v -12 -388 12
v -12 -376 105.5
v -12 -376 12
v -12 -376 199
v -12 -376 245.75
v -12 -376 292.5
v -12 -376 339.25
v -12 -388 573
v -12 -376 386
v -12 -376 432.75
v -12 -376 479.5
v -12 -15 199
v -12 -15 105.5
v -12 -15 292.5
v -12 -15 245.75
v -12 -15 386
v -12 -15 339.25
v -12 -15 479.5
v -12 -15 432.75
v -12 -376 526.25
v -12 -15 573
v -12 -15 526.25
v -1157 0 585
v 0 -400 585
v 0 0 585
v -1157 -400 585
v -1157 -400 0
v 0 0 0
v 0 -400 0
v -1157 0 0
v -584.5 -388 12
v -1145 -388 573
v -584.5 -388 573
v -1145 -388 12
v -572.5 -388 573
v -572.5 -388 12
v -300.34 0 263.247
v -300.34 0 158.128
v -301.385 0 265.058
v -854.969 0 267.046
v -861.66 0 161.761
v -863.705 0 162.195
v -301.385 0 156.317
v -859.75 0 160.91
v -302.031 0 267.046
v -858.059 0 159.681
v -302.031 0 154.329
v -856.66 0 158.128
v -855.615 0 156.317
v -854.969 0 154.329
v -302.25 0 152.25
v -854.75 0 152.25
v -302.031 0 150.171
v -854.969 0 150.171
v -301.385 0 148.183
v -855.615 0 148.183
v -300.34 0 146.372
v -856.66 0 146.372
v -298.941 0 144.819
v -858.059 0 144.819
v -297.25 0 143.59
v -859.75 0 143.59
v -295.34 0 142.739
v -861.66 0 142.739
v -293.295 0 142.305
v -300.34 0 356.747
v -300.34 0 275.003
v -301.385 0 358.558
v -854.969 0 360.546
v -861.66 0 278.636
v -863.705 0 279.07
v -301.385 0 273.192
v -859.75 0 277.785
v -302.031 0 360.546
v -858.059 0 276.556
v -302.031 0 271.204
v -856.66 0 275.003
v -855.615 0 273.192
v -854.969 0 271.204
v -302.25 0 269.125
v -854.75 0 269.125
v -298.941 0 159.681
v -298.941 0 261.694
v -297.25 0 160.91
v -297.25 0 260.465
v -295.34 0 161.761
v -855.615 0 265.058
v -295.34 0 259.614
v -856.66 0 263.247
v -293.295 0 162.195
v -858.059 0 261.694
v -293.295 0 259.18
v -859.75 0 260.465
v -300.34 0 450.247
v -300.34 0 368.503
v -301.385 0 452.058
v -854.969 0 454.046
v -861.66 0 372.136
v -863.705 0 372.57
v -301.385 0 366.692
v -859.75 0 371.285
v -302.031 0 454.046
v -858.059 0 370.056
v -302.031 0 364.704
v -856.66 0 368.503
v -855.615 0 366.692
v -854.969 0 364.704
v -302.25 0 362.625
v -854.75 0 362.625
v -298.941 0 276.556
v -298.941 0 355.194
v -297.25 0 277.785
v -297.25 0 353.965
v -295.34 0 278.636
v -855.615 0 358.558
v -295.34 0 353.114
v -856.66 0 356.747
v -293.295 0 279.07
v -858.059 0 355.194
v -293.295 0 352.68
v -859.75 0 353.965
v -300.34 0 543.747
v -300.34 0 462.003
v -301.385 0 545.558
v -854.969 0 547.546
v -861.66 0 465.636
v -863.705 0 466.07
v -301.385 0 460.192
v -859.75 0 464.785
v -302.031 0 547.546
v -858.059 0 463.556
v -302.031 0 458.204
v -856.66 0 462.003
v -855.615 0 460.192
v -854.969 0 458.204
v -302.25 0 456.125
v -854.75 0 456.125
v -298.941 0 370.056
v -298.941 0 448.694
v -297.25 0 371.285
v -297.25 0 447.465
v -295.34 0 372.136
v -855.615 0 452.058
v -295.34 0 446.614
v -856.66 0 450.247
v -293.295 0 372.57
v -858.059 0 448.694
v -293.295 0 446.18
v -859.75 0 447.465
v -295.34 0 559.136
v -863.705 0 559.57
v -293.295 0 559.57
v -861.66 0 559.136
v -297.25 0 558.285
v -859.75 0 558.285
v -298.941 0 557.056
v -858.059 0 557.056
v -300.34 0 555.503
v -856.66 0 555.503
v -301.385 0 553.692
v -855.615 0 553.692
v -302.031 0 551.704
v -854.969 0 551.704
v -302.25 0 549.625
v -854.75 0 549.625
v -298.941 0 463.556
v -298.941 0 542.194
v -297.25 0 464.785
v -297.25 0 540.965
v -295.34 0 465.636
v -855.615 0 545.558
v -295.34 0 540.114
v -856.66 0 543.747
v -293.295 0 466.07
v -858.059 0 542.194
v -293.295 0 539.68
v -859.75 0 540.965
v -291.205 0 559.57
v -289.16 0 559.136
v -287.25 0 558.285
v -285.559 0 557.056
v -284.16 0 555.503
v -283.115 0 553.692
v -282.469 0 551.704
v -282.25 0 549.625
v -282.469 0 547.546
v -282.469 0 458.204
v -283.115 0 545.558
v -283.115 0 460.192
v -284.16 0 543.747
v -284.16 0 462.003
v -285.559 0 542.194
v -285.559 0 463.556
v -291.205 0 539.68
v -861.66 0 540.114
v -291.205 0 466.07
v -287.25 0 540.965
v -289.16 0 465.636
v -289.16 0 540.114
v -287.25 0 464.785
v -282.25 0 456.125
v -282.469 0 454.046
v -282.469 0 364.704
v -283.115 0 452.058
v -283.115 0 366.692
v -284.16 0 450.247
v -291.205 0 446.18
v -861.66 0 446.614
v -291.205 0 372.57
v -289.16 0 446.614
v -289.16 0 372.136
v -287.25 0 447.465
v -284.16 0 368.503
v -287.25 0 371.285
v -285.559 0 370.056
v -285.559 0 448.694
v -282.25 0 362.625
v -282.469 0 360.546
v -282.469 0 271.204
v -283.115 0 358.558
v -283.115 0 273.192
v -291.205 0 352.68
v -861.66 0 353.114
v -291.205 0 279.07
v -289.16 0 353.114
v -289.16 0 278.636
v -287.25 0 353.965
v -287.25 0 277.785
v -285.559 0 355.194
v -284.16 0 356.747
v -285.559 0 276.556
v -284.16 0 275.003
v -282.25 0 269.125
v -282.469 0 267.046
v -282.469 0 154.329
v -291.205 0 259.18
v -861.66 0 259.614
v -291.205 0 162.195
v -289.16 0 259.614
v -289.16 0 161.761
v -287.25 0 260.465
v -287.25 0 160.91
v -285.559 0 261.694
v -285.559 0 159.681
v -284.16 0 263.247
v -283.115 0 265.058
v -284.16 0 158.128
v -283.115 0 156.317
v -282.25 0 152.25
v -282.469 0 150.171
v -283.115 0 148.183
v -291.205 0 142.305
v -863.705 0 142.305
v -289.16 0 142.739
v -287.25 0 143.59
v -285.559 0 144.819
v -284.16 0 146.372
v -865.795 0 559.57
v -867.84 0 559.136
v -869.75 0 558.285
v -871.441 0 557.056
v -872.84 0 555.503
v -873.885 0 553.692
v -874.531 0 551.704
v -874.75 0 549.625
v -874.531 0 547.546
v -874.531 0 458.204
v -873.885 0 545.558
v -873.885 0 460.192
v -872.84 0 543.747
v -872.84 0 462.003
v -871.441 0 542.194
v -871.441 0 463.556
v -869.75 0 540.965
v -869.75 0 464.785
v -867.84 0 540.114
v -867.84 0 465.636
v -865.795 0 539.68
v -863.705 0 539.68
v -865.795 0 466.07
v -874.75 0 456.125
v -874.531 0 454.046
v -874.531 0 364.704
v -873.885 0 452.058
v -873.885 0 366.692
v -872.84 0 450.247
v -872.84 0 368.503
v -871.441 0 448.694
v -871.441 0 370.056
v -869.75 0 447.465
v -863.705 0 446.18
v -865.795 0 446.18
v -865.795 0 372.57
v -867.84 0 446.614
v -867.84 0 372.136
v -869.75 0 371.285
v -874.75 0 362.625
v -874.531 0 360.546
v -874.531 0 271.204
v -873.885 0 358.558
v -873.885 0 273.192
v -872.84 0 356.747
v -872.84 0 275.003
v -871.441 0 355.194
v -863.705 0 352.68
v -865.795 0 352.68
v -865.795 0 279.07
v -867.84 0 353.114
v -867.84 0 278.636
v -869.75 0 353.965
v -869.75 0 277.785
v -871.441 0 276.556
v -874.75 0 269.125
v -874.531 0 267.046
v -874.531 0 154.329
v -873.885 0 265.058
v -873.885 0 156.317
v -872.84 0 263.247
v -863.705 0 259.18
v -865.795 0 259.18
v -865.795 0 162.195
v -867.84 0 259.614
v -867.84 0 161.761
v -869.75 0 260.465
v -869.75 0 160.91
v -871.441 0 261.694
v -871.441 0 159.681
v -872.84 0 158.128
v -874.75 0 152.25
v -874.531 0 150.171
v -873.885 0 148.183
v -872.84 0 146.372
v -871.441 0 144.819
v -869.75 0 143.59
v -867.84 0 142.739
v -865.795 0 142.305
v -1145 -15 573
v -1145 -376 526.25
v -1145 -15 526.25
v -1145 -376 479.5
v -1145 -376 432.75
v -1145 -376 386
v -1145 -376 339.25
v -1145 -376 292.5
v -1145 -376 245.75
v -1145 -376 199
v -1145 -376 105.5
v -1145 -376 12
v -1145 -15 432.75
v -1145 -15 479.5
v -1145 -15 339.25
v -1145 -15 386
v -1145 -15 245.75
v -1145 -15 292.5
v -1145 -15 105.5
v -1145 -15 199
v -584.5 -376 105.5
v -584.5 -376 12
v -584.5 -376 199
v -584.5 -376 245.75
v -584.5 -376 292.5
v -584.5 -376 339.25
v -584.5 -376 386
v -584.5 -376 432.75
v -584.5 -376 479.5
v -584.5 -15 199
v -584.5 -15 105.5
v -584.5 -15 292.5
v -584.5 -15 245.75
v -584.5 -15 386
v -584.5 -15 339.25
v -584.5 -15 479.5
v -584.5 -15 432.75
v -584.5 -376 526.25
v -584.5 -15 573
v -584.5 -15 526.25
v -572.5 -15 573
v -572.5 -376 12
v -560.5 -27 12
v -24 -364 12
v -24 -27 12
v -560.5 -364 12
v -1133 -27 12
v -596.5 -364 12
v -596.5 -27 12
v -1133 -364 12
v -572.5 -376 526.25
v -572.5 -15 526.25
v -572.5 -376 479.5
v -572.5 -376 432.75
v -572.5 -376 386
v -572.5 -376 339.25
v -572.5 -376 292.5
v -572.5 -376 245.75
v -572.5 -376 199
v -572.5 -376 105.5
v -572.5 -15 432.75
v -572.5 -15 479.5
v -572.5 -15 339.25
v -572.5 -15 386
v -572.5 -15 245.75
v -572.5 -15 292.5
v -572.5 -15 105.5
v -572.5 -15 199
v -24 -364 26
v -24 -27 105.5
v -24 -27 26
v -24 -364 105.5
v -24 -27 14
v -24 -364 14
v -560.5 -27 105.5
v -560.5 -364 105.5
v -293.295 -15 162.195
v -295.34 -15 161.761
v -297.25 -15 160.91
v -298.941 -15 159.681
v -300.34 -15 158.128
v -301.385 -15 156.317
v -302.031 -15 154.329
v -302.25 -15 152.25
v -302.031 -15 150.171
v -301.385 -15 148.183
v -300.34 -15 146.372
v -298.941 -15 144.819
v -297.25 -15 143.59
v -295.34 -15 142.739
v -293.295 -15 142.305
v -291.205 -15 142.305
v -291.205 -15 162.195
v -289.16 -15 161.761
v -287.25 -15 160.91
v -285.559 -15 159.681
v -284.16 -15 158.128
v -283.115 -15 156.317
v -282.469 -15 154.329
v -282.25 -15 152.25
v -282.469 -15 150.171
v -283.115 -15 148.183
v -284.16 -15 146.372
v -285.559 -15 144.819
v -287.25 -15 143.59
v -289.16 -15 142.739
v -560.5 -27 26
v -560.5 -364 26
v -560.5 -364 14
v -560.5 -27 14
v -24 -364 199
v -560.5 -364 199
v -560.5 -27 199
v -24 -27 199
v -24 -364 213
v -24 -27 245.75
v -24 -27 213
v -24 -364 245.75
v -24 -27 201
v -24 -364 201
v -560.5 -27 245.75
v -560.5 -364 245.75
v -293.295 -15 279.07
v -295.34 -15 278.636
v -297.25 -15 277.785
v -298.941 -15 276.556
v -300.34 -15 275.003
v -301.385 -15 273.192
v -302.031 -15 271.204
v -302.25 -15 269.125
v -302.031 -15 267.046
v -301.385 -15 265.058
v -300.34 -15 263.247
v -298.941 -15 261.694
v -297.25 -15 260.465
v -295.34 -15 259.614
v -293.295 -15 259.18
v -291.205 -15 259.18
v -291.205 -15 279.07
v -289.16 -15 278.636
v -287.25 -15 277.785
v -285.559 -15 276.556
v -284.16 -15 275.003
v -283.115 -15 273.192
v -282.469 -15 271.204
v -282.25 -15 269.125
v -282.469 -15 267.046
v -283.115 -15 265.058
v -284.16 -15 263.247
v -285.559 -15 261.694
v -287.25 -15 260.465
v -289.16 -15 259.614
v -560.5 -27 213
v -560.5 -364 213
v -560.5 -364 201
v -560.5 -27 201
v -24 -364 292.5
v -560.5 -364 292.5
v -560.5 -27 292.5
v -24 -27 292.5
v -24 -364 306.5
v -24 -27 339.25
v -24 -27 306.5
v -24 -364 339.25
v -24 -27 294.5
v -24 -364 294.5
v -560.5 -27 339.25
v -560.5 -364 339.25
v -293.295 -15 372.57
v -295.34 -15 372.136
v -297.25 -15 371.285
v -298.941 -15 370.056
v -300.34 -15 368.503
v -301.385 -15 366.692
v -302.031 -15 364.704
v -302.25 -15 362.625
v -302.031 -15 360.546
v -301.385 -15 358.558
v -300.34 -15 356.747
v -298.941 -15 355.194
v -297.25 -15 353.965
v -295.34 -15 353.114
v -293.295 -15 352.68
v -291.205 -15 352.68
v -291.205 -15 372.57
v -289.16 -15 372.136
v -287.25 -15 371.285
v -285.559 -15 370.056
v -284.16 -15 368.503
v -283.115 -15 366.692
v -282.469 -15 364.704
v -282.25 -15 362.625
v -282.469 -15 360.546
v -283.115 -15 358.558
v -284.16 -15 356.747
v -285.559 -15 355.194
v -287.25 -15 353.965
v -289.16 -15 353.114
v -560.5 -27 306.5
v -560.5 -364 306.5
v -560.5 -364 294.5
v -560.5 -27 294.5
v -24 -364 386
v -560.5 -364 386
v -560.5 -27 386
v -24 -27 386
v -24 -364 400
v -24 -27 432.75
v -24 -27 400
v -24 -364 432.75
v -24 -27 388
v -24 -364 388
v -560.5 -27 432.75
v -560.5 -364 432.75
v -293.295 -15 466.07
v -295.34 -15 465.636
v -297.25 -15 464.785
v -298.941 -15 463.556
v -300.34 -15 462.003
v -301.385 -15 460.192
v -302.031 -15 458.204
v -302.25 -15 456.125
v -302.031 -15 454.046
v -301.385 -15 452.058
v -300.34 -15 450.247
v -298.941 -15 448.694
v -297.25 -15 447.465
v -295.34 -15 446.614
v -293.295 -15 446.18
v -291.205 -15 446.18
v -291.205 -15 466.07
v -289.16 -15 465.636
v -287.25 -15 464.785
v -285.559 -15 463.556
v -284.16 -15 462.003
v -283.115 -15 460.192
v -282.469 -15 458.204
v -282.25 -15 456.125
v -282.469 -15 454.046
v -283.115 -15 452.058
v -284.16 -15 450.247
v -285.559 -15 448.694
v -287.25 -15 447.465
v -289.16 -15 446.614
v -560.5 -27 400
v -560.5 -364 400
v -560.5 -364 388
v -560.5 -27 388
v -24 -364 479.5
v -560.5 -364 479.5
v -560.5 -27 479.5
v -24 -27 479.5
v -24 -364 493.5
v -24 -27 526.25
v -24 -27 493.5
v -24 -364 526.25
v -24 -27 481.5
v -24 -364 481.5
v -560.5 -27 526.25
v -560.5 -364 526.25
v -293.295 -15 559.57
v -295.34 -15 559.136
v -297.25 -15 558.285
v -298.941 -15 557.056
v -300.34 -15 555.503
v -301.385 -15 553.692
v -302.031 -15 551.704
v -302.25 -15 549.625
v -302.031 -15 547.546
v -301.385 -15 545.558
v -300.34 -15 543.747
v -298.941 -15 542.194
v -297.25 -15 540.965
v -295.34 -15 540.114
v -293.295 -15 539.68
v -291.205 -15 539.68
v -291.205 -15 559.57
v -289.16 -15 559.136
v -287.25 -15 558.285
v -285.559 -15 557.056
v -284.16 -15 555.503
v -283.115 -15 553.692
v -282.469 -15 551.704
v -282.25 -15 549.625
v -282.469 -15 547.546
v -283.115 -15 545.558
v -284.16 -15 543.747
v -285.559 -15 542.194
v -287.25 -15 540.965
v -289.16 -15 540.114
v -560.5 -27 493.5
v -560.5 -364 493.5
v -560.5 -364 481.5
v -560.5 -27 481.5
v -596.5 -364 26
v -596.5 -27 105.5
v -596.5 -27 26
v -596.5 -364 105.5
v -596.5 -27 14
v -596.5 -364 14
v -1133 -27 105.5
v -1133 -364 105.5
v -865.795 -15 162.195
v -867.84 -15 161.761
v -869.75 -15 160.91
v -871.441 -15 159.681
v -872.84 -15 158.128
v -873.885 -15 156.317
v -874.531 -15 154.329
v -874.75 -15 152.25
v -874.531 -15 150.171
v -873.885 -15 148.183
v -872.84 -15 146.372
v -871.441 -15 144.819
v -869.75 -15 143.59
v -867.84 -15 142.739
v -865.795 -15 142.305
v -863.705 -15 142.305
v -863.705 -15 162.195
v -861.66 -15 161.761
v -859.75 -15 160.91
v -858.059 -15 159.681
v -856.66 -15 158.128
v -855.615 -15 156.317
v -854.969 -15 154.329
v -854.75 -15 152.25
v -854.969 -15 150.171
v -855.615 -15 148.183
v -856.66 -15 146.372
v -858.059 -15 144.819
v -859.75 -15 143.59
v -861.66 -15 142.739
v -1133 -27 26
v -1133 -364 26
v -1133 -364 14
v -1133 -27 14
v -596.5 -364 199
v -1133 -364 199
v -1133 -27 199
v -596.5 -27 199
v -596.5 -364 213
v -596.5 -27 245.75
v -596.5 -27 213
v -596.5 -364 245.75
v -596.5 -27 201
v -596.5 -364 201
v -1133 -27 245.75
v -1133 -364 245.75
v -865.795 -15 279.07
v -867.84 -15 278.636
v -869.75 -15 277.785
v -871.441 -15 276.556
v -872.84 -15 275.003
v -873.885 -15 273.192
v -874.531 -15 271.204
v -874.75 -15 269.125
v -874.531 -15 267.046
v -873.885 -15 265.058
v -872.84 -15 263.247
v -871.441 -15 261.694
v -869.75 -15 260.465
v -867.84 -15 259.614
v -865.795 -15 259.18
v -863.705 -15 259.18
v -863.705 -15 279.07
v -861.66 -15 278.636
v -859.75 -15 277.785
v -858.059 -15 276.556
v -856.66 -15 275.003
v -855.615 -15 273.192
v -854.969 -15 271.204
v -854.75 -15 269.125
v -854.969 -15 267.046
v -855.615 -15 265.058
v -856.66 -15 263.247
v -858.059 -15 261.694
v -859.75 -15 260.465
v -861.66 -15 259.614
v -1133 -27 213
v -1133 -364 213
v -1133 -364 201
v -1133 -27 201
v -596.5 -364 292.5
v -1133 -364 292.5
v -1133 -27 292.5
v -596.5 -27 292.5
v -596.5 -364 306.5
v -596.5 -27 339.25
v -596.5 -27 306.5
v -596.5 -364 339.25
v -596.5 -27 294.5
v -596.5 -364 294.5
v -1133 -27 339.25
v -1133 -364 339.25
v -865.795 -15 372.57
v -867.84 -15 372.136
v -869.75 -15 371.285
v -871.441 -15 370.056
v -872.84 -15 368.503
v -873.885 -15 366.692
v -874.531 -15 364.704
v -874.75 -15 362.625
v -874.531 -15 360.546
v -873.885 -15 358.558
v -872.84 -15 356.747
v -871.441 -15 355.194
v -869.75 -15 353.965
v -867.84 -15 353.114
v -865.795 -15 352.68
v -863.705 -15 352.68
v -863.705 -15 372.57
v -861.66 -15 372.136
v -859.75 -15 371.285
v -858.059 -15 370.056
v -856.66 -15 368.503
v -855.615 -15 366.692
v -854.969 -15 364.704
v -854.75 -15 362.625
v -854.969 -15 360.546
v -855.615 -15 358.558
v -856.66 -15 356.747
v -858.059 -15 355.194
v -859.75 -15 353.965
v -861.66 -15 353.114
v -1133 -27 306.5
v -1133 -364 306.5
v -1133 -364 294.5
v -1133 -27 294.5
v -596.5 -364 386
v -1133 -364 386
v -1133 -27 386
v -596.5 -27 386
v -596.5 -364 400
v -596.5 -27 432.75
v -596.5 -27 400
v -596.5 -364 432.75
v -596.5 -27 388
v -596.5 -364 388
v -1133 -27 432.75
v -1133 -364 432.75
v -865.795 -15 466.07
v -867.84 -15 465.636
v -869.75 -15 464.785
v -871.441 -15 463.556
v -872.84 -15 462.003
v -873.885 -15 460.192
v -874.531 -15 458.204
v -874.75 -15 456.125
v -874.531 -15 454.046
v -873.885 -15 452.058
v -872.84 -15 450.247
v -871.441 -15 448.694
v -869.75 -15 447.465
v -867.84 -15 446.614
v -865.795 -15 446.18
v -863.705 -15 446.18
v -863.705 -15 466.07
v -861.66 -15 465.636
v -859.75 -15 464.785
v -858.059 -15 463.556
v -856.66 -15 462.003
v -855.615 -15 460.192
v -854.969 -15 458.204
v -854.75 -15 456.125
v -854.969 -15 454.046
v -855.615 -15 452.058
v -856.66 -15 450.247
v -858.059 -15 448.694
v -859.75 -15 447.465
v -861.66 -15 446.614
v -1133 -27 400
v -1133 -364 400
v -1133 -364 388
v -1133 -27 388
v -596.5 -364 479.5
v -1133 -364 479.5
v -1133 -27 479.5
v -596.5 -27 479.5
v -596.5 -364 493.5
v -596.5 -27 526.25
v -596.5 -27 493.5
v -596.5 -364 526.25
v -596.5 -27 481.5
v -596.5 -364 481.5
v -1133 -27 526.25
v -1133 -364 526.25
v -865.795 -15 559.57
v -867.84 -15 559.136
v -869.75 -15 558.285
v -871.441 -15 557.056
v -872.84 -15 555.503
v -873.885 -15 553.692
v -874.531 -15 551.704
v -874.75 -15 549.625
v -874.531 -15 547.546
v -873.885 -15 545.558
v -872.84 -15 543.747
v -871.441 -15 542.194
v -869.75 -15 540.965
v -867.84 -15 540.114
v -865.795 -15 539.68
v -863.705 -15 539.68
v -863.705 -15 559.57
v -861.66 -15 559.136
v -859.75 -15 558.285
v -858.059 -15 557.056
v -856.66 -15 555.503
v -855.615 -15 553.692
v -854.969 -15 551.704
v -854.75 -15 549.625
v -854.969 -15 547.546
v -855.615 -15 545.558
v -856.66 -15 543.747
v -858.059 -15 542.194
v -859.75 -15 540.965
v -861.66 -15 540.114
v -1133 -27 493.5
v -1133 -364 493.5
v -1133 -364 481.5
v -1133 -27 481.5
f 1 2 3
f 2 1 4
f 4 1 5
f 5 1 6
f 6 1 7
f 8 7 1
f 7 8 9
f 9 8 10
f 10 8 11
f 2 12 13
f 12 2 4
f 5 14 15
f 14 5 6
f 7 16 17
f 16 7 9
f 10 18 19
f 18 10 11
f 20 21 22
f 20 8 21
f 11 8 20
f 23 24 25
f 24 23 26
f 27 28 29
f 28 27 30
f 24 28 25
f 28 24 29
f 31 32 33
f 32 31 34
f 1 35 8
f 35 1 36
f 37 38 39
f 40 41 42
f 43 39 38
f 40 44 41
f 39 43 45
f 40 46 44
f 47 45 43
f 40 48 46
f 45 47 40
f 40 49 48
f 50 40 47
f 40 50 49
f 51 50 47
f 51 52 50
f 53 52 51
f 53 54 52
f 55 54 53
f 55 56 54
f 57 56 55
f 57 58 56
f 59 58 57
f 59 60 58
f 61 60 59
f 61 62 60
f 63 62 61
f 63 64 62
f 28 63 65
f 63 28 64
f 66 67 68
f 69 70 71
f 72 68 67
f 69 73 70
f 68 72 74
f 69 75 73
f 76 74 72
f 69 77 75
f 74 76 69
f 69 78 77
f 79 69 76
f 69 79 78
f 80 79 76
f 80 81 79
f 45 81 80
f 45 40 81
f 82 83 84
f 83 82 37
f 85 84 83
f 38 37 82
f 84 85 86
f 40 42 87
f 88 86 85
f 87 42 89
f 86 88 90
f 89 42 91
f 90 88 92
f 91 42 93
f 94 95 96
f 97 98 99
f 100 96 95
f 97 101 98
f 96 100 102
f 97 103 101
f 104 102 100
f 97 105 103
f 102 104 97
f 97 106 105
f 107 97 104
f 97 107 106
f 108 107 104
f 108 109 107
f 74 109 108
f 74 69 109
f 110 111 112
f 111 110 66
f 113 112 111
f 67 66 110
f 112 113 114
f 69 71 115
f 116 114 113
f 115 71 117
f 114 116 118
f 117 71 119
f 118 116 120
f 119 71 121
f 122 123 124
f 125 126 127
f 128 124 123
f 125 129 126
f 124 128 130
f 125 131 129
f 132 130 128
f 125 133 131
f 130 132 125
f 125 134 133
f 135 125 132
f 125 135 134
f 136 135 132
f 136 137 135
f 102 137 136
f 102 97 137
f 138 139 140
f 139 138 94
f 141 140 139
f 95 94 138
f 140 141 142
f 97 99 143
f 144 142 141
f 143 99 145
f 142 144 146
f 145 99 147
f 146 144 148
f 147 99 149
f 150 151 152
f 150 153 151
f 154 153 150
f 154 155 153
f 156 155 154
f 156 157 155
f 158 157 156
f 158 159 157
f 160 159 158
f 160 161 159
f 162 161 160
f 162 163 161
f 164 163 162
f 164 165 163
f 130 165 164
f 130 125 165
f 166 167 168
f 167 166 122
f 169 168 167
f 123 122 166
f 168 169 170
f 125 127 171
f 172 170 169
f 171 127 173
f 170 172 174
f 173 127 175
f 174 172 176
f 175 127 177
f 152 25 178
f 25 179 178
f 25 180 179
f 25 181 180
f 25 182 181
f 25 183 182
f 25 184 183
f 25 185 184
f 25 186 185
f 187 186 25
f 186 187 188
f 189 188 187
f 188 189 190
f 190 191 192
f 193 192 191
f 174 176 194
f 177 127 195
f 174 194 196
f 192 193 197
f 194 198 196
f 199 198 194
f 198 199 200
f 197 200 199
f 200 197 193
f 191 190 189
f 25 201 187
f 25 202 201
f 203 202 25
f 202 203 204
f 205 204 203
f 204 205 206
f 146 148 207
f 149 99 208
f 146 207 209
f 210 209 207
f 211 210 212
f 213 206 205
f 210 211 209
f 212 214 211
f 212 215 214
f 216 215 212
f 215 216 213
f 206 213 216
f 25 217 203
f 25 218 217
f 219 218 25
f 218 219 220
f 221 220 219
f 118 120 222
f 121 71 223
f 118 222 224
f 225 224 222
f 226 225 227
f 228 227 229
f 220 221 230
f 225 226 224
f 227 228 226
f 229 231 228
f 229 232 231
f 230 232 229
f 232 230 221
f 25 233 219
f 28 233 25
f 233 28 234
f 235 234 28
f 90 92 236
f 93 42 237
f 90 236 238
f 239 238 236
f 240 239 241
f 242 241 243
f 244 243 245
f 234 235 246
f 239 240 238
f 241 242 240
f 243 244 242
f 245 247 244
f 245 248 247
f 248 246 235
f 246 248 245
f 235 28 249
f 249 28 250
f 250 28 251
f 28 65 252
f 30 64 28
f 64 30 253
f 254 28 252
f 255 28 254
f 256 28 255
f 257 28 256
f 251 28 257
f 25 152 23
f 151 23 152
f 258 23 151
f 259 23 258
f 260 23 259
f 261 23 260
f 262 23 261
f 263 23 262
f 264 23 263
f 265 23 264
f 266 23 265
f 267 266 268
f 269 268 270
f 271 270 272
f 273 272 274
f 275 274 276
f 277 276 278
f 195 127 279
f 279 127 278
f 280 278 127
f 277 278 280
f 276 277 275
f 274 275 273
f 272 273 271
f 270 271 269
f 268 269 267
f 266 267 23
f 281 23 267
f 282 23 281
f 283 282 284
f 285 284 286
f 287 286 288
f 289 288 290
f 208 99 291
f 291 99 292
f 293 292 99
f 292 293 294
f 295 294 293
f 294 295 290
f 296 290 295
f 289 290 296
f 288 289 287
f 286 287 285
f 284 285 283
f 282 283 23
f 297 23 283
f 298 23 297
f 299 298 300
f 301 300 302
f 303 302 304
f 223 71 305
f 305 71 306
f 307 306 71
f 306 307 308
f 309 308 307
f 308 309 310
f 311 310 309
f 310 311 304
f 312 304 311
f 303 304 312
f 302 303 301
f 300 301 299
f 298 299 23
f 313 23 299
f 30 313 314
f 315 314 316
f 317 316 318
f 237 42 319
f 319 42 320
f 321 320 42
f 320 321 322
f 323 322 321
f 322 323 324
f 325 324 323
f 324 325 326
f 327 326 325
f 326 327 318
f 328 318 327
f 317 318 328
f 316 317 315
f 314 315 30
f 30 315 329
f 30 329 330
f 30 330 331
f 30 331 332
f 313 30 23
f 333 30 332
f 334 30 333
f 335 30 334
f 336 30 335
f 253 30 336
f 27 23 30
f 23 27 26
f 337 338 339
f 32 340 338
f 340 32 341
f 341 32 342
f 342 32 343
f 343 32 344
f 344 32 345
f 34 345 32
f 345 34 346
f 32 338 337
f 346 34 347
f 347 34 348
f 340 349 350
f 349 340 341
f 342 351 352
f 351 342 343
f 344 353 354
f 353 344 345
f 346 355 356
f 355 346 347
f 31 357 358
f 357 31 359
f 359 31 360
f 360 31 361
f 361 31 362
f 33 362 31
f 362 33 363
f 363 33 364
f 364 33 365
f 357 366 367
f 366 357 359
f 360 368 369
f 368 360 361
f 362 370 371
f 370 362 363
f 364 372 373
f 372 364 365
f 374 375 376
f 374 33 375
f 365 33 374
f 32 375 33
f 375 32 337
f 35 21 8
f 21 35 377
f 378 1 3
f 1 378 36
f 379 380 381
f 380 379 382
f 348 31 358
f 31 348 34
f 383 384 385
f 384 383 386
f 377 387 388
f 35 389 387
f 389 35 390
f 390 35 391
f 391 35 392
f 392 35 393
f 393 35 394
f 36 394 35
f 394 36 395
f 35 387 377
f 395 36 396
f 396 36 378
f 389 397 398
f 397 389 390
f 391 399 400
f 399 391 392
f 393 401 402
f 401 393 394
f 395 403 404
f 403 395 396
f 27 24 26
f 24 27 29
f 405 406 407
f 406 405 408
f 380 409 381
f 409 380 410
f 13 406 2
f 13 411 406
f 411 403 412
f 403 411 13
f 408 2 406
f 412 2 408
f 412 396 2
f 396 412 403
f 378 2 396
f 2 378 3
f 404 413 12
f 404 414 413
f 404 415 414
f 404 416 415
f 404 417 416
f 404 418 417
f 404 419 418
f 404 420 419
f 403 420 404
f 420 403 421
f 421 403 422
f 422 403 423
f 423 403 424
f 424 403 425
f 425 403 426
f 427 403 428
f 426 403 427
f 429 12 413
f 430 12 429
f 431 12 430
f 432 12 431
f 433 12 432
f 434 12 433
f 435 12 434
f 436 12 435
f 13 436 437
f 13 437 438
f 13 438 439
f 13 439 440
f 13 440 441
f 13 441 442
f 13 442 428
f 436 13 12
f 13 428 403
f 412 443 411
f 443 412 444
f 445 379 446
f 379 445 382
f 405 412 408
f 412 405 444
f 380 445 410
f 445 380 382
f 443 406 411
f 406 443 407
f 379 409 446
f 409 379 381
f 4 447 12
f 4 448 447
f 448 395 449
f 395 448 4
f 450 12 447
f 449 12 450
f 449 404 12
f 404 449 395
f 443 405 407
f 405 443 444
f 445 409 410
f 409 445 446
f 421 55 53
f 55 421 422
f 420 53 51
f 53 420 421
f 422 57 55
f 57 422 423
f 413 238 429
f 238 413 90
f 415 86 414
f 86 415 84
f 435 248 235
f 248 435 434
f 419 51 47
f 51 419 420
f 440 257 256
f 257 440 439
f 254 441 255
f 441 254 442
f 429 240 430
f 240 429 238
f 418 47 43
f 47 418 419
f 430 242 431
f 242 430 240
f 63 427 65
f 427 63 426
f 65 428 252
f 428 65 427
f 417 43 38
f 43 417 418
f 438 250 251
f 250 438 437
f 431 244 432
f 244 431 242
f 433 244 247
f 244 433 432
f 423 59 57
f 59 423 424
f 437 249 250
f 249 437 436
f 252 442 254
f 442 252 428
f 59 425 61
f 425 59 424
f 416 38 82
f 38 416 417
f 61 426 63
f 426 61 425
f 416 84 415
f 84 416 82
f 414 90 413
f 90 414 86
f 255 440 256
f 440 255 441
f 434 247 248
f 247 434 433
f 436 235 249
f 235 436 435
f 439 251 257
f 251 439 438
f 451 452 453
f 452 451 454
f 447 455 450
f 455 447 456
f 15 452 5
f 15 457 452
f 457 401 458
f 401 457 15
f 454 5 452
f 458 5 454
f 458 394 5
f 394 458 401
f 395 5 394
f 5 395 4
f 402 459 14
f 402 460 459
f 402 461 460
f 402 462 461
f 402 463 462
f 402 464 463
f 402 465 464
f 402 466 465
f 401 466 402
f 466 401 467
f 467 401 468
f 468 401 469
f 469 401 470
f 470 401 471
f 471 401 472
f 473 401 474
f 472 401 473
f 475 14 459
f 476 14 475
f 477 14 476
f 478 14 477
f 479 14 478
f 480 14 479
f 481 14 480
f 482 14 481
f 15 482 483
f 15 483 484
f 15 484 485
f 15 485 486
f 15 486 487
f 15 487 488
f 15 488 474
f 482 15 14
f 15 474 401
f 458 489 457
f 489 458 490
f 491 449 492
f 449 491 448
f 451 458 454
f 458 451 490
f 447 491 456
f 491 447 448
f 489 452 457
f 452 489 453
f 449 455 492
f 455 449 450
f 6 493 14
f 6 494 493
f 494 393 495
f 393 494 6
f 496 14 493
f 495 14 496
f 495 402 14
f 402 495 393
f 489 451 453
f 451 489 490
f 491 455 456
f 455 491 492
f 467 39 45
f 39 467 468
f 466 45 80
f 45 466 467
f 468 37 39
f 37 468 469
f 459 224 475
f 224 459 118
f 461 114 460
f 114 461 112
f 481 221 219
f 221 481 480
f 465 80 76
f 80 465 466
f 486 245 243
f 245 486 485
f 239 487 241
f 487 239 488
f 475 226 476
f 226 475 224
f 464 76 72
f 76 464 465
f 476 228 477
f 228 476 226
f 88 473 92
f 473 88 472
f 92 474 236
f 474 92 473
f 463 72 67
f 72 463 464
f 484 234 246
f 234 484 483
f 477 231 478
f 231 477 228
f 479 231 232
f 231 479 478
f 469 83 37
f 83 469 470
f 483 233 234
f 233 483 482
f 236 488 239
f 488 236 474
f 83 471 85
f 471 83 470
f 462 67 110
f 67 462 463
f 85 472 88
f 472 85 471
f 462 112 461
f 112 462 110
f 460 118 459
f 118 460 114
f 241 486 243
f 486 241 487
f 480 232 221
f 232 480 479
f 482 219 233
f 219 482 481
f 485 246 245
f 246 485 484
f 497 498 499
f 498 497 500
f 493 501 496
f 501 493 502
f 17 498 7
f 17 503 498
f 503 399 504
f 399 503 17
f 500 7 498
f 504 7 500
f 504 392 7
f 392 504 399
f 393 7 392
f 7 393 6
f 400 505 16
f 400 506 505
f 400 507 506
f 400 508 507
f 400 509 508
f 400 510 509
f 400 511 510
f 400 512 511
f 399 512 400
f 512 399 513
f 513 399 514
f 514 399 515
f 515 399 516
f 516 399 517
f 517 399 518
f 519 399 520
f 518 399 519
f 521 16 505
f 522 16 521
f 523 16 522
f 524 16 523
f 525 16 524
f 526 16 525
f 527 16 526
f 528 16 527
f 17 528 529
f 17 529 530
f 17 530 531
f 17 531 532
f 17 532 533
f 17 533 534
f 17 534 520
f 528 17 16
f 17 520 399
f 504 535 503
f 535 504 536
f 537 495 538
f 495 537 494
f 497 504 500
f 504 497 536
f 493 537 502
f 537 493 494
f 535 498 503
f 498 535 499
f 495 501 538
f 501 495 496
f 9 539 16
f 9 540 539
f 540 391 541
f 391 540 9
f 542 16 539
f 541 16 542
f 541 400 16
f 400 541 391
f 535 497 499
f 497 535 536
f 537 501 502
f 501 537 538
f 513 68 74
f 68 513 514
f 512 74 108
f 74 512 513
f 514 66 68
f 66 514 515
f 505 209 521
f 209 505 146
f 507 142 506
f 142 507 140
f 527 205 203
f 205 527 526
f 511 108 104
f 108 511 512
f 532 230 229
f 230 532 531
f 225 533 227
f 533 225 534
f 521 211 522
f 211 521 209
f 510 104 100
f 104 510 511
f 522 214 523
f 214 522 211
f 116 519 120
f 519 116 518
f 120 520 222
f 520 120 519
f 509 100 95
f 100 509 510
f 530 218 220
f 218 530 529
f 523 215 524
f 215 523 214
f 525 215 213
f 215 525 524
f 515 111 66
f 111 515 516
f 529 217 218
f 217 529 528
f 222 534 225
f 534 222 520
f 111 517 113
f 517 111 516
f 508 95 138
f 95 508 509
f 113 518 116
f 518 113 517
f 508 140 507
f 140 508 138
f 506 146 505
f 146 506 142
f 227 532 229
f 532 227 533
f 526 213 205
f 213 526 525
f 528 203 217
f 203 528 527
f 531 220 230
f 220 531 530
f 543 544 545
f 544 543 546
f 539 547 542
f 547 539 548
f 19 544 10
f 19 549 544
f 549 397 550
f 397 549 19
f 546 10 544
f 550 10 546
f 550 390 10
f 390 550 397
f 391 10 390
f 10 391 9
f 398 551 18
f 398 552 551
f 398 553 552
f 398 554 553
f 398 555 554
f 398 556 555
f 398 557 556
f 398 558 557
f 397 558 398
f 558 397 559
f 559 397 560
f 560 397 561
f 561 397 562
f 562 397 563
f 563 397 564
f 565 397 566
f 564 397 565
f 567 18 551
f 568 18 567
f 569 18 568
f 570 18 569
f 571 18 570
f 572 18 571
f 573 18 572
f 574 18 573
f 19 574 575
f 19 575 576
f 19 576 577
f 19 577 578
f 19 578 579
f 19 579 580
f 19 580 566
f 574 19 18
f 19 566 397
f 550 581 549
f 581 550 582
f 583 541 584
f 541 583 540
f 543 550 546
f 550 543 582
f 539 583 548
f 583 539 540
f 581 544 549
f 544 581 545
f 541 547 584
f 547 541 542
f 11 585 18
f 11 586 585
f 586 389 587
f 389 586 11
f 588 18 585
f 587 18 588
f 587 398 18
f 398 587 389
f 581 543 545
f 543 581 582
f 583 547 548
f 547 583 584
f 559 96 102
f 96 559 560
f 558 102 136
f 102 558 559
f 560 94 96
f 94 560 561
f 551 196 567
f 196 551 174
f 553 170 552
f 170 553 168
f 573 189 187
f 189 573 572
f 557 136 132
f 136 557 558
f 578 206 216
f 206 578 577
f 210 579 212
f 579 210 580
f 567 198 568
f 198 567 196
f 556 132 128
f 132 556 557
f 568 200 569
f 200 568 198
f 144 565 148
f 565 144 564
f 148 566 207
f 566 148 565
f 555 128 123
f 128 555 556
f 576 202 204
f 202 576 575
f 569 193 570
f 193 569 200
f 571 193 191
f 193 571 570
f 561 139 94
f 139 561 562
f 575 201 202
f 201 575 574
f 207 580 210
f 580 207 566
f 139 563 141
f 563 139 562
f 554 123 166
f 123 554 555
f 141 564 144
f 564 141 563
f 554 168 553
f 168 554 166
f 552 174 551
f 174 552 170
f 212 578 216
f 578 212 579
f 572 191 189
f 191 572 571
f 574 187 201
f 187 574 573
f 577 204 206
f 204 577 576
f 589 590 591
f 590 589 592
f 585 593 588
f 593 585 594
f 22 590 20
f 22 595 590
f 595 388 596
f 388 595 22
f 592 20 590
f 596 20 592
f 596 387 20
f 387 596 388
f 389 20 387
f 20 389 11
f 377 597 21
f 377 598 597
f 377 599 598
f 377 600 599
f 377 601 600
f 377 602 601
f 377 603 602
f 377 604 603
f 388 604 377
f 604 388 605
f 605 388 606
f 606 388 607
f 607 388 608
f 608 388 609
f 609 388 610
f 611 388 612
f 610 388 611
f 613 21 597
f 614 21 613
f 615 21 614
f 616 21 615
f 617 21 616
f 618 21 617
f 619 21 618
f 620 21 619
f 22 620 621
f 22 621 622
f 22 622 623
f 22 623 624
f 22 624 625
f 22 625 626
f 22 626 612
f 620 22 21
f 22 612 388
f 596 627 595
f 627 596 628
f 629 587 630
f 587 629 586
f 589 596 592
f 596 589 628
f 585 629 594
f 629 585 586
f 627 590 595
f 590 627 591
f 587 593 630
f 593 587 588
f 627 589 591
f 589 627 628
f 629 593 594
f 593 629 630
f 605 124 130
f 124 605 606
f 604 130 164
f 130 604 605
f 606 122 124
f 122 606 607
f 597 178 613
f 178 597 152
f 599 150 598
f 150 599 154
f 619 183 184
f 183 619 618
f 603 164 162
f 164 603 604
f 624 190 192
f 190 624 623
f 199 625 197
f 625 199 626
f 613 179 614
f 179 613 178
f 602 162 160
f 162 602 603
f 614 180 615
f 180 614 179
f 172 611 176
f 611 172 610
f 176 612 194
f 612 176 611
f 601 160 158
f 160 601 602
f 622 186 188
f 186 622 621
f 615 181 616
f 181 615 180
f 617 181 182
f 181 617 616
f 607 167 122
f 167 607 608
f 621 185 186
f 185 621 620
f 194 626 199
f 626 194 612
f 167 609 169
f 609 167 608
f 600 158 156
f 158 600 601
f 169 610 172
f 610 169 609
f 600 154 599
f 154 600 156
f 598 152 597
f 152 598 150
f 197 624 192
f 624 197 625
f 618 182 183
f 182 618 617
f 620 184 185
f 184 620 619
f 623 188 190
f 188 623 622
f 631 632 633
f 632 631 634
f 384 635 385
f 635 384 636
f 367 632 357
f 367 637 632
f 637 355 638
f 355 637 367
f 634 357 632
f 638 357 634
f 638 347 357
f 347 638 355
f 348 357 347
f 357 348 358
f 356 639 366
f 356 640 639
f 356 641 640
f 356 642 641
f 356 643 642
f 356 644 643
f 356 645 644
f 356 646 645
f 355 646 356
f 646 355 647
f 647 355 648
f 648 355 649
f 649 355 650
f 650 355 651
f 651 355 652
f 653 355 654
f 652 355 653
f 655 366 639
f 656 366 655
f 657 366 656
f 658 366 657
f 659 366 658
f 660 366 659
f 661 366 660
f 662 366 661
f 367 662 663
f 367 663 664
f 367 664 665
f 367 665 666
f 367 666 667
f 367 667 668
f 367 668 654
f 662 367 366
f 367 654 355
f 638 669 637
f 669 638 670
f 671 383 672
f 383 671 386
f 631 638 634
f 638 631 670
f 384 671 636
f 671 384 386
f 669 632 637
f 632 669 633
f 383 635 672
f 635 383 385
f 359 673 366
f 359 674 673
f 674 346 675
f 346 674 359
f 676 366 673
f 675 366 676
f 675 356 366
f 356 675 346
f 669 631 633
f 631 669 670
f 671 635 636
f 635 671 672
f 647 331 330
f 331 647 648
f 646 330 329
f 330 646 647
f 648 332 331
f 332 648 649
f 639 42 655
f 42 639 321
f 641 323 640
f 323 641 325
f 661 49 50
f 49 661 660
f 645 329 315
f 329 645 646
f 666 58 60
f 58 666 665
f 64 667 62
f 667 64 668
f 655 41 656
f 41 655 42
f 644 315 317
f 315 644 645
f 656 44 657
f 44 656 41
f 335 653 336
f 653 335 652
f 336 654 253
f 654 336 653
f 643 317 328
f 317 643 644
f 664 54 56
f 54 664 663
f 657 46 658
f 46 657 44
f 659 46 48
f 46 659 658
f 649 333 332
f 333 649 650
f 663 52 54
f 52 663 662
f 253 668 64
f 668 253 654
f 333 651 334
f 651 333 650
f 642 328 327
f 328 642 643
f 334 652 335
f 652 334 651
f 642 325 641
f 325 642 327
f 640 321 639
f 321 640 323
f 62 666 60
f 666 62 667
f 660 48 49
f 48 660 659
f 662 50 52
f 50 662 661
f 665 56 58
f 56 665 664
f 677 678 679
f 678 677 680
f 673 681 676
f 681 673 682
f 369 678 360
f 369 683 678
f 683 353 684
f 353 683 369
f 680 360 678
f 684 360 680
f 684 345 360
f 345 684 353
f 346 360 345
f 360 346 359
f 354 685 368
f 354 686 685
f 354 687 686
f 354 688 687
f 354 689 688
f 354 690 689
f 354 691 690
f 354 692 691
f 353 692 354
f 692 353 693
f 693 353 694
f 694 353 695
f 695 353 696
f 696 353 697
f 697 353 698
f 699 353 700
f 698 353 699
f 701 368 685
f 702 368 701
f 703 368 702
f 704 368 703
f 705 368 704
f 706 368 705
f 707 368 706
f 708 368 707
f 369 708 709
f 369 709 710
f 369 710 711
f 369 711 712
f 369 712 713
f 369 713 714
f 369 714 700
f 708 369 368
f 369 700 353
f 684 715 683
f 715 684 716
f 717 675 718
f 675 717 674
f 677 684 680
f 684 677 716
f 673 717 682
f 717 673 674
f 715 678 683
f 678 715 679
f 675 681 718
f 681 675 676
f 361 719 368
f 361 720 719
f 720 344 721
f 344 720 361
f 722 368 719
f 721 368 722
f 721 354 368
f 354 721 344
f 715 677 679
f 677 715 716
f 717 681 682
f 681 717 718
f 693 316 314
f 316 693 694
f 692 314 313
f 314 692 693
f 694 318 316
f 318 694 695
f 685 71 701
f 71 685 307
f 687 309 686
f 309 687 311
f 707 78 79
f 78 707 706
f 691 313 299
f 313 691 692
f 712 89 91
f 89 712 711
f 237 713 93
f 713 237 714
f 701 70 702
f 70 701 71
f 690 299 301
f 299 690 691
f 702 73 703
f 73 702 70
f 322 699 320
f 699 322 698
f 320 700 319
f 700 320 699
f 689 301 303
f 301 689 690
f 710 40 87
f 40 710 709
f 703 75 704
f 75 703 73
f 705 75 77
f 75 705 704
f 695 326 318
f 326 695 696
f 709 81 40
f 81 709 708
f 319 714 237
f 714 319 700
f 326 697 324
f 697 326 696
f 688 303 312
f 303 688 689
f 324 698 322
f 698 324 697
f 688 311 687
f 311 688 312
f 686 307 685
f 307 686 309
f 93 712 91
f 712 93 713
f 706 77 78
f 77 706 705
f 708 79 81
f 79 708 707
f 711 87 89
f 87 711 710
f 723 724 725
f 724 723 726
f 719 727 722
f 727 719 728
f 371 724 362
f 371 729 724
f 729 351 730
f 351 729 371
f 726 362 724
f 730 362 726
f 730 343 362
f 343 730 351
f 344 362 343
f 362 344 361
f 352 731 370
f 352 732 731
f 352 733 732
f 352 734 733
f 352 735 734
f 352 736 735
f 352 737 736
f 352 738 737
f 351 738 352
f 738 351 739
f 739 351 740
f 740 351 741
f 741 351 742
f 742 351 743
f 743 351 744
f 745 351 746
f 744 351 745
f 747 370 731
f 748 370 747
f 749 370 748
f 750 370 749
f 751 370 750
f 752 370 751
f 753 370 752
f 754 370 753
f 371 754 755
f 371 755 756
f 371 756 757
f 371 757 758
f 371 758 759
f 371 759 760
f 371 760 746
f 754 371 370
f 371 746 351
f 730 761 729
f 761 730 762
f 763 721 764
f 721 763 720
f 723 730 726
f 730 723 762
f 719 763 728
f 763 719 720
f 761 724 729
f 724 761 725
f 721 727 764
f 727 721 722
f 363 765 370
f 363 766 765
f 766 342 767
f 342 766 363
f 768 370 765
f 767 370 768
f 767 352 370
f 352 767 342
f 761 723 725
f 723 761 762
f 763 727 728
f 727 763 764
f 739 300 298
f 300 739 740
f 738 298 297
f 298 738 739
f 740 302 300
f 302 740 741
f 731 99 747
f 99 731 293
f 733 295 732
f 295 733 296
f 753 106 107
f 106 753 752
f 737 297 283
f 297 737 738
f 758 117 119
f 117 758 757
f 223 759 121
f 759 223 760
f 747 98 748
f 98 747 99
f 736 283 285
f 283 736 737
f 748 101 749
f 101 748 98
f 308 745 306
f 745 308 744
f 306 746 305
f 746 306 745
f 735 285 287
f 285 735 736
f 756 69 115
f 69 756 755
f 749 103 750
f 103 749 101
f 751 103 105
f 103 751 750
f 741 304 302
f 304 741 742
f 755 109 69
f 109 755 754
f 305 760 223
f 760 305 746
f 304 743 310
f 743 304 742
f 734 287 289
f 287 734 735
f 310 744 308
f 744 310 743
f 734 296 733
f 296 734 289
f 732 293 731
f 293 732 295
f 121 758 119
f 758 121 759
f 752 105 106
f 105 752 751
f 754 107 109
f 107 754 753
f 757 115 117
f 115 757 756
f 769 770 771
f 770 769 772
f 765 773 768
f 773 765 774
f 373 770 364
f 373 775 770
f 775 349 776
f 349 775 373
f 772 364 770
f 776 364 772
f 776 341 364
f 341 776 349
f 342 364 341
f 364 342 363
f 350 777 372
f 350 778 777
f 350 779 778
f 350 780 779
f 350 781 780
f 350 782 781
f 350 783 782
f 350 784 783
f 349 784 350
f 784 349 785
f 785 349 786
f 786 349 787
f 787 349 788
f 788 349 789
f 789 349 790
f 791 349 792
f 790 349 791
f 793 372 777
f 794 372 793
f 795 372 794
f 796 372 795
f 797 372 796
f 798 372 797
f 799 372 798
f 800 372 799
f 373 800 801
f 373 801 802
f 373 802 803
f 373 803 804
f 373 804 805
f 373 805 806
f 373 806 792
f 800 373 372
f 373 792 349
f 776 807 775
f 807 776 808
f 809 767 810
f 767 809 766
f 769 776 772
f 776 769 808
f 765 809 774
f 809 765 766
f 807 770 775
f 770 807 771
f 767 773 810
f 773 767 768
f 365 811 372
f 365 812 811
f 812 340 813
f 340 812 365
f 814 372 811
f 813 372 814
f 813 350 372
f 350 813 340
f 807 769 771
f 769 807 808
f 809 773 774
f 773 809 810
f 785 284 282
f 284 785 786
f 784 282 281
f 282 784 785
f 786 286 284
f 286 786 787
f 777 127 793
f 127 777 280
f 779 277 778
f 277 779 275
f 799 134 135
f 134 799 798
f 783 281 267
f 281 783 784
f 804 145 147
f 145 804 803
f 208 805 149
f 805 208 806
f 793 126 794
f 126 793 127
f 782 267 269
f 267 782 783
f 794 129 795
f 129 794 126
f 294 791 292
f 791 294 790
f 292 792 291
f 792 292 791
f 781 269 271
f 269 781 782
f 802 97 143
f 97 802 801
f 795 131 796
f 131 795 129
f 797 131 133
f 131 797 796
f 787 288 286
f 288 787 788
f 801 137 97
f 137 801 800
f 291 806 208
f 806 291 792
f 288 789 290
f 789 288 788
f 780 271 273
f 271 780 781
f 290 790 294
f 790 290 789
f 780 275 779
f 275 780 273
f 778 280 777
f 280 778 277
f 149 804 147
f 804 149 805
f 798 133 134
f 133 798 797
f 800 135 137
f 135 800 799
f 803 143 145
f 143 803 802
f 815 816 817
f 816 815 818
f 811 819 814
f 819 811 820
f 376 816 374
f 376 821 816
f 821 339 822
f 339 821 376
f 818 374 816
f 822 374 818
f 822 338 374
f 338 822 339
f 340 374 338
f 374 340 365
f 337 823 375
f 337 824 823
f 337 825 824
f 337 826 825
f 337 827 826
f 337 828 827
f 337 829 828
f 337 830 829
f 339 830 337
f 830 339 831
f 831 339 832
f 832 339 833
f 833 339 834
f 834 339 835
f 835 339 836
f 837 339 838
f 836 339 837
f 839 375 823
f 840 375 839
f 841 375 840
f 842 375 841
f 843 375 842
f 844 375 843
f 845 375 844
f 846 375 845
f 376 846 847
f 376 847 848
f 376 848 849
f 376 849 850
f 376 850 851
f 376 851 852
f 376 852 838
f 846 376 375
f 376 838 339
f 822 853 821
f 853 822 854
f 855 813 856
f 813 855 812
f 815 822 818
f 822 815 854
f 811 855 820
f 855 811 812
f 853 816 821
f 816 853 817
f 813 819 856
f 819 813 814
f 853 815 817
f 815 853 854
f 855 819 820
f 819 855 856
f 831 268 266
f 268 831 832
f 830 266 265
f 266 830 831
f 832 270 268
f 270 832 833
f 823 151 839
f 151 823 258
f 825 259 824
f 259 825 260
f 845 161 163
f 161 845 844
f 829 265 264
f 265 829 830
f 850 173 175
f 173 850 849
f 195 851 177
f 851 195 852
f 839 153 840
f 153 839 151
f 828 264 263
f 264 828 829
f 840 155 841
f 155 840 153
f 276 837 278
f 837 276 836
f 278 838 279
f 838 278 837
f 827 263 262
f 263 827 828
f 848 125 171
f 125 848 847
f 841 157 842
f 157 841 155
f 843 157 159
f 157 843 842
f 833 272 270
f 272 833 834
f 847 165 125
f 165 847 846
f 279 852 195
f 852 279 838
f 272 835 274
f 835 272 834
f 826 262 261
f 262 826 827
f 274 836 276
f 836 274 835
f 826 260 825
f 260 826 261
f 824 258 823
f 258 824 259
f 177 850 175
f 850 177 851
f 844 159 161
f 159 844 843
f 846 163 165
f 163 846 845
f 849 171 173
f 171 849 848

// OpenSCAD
// file: storage-unit.scad
/*

    Storage Unit
    
    By Anton Augustsson


*/



module storageUnit (
    thickness,
    length,
    width,
    height,
    x,y,z
    ){
/*
    ---------- Local varibles ---------- 
*/


/*
    ---------- Code ---------- 
*/

translate([
    x,
    y,
    z]) 
union () {

// Left
color("Wheat")
translate([
    0,
    0,
    0]) 
cube(size = [
    thickness,
    length-thickness,
    height]);

// Right
color("Wheat")
translate([
    width-thickness,
    0,
    0]) 
cube(size = [
    thickness,
    length-thickness,
    height]);


// Divider
color("Wheat")
translate([
    (width-thickness)/2,
    0,
    thickness]) 
cube(size = [
    thickness,
    length-thickness,
    height-thickness*2]);
    
    
// Back
color("Wheat")
translate([
    0,
    length-thickness,
    0]) 
cube(size = [
    width,
    thickness,
    height]);

// Bottom 
color("Wheat")
translate([
    thickness,
    0,
    0]) 
cube(size = [
    width-thickness*2,
    length-thickness,
    thickness]);

// Top
color("BurlyWood")
translate([
    thickness,
    0,
    height-thickness]) 
cube(size = [
    width-thickness*2,
    length-thickness,
    thickness]);    


}}
    
/*
    ---------- Example ---------- 
*/


thickness= 12;

length = 500;
width  = 600;
height = 400;

x=0;
y=0;
z=0;
yRotate=0;

storageUnit (
    thickness,
    length,
    width,
    height,
    x,y,z
    );
// file: sliding-shelf.scad
/*

    Sliding Shelf
    
    By Anton Augustsson


*/

// use dovtail library

module slidingShelf (
    thicknessBottom,
    thicknessSide,
    thicknessFront,
    lenghtShelf,
    widthShelf,
    heightShelf,
    xShelf,yShelf,zShelf,
    yRotate
    ){
/*
    ---------- Local varibles ---------- 
*/

length = lenghtShelf;
width  = widthShelf;
height = 100;
heightSide = height-20;

x=xShelf;
y=yShelf;
z=zShelf;

/*
    ---------- Code ---------- 
*/

translate([
    x,
    y,
    z]) 
union () {

// Left
color("Wheat")
translate([
    0,
    thicknessFront,
    0]) 
cube(size = [
    thicknessSide,
    length-thicknessFront,
    heightSide]);

// Right
color("Wheat")
translate([
    width-thicknessSide,
    thicknessFront,
    0]) 
cube(size = [
    thicknessSide,
    length-thicknessFront,
    heightSide]);
    
// Back
color("Wheat")
translate([
    thicknessSide,
    length-thicknessSide,
    0]) 
cube(size = [
    width-thicknessSide*2,
    thicknessSide,
    heightSide]);

// Front
color("BurlyWood")
translate([
    thicknessSide,
    thicknessFront,
    0]) 
cube(size = [
    width-thicknessSide*2,
    thicknessSide,
    heightSide]);    

// Front face
color("BurlyWood")
translate([
    0,
    0,
    0]) 
cube(size = [
    width,
    thicknessFront,
    height]);    

// Bottom 
color("Wheat")
translate([
    thicknessSide,
    thicknessFront+thicknessSide,
    2]) 
cube(size = [
    width-thicknessSide*2,
    length-thicknessFront-thicknessSide*2,
    thicknessBottom]);

}}
    
/*
    ---------- Example ---------- 
*/


thicknessBottom = 12;
thicknessSide   = 12;
thicknessFront  = 15;

length = 500;
width  = 600;
height = 100;


x=0;
y=0;
z=0;
yRotate=0;

slidingShelf  (
    thicknessBottom,
    thicknessSide,
    thicknessFront,
    length,
    width,
    height,
    x,y,z,
    yRotate
    );
// file: simple-drawer.scad
/*

    Simple Drawer
    
    By Anton Augustsson


*/



module simpleDrawer (
    thicknessBottom,
    thicknessSide,
    thicknessFront,
    lenghtDrawer,
    widthDrawer,
    heightDrawer,
    xDrawer,yDrawer,zDrawer
    ){
/*
    ---------- Local varibles ---------- 
*/

length = lenghtDrawer;
width  = widthDrawer;
height = heightDrawer;
heightSide = height/2;

x=xDrawer;
y=yDrawer;
z=zDrawer;

/*
    ---------- Code ---------- 
*/

translate([
    x,
    y,
    z]) 
difference () {
union () {

// Left
color("Wheat")
translate([
    0,
    thicknessFront,
    0]) 
cube(size = [
    thicknessSide,
    length-thicknessFront,
    heightSide]);

// Right
color("Wheat")
translate([
    width-thicknessSide,
    thicknessFront,
    0]) 
cube(size = [
    thicknessSide,
    length-thicknessFront,
    heightSide]);
    
// Back
color("Wheat")
translate([
    thicknessSide,
    length-thicknessSide,
    0]) 
cube(size = [
    width-thicknessSide*2,
    thicknessSide,
    heightSide]);

// Front
color("BurlyWood")
translate([
    thicknessSide,
    thicknessFront,
    0]) 
cube(size = [
    width-thicknessSide*2,
    thicknessSide,
    heightSide]);    

// Front face
color("BurlyWood")
translate([
    0,
    0,
    0]) 
cube(size = [
    width,
    thicknessFront,
    height]);    

// Bottom 
color("Wheat")
translate([
    thicknessSide,
    thicknessFront+thicknessSide,
    2]) 
cube(size = [
    width-thicknessSide*2,
    length-thicknessFront-thicknessSide*2,
    thicknessBottom]);

}


translate([
    width/2,                   
    -1,   
    height/4*3
    ])  
rotate([270,0,0])
cylinder(
    h = thicknessFront+2,    
    r = 10        
    );      

}}
    
/*
    ---------- Example ---------- 
*/


thicknessBottom = 12;
thicknessSide   = 12;
thicknessFront  = 15;

length = 500;
width  = 600;
height = 100;


x=0;
y=0;
z=0;
yRotate=0;

simpleDrawer (
    thicknessBottom,
    thicknessSide,
    thicknessFront,
    length,
    width,
    height,
    x,y,z
    );
// main file
/*

    Drawer Storage
    
    By Anton Augustsson


*/

use <simple-drawer.scad>;
use <sliding-shelf.scad>;
use <storage-unit.scad>;

module drawerStorage (
    thickness,
    length,
    width,
    height,
    x,y,z,
    zRotate
    ){
/*
    ---------- Local varibles ---------- 
*/


storageUnitThickness = thickness;
storageUnitWidth     = width;
storageUnitLength    = length;
storageUnitHeight    = height;

thicknessBottom = thickness;
thicknessSide   = thickness;
thicknessFront  = 15;
        
slidingShelfWidth  = (length
        -thickness*2)/2-
        thickness/2;
slidingShelfLength = width
        -thickness*2;
slidingShelfHeight = height/3*2
        +9;

drawerWidth  = slidingShelfWidth;
drawerLength = slidingShelfLength;
drawerHeight = (height-2*thickness)/6;

/*
    ---------- Code ---------- 
*/

translate([
    x,
    y,
    z]) 
rotate([0,0,zRotate])
union () {

storageUnit (
    storageUnitThickness,
    storageUnitWidth,
    storageUnitLength,
    storageUnitHeight,
    0,0,0
    );

// Starting from lower corner    
// 1 Large    
simpleDrawer  (
    thicknessBottom,
    thicknessSide,
    thicknessFront,
    drawerLength,
    drawerWidth,
    drawerHeight*2,
    thickness,
    0,
    thickness
    );

// 2     
simpleDrawer  (
    thicknessBottom,
    thicknessSide,
    thicknessFront,
    drawerLength,
    drawerWidth,
    drawerHeight,
    thickness,
    0,
    thickness+drawerHeight*2
    );

// 3
simpleDrawer  (
    thicknessBottom,
    thicknessSide,
    thicknessFront,
    drawerLength,
    drawerWidth,
    drawerHeight,
    thickness,
    0,
    thickness+drawerHeight*3
    );

// 4
simpleDrawer  (
    thicknessBottom,
    thicknessSide,
    thicknessFront,
    drawerLength,
    drawerWidth,
    drawerHeight,
    thickness,
    0,
    thickness+drawerHeight*4
    );

// 5
simpleDrawer  (
    thicknessBottom,
    thicknessSide,
    thicknessFront,
    drawerLength,
    drawerWidth,
    drawerHeight,
    thickness,
    0,
    thickness+drawerHeight*5
    );



// 6 Large    
simpleDrawer  (
    thicknessBottom,
    thicknessSide,
    thicknessFront,
    drawerLength,
    drawerWidth,
    drawerHeight*2,
    thickness*2
    +slidingShelfWidth,
    0,
    thickness
    );

// 7
simpleDrawer  (
    thicknessBottom,
    thicknessSide,
    thicknessFront,
    drawerLength,
    drawerWidth,
    drawerHeight,
    thickness*2
    +slidingShelfWidth,
    0,
    thickness+drawerHeight*2
    );

// 8
simpleDrawer  (
    thicknessBottom,
    thicknessSide,
    thicknessFront,
    drawerLength,
    drawerWidth,
    drawerHeight,
    thickness*2
    +slidingShelfWidth,
    0,
    thickness+drawerHeight*3
    );    

// 9
simpleDrawer  (
    thicknessBottom,
    thicknessSide,
    thicknessFront,
    drawerLength,
    drawerWidth,
    drawerHeight,
    thickness*2
    +slidingShelfWidth,
    0,
    thickness+drawerHeight*4
    );    

// 10
simpleDrawer  (
    thicknessBottom,
    thicknessSide,
    thicknessFront,
    drawerLength,
    drawerWidth,
    drawerHeight,
    thickness*2
    +slidingShelfWidth,
    0,
    thickness+drawerHeight*5
    );    

}}
    
/*
    ---------- Example ---------- 
*/


standardSheathingWidth = 1220; 
standardSheathingLength = 2440;

mdfTopThickness = 19;
plywoodTopThickness = 12;

// Side protection for ply and mdf
edgeTopThickness = 20; 
edgeTopWidth = 167;
edgeTopLengthX = standardSheathingLength
    +2*edgeTopThickness;
edgeTopLengthY = standardSheathingWidth
    +2*edgeTopThickness;

// 4 list betweend mdf and ply (Pine)
listTopThickness = 20; 
listTopWidth = 80;
listTopLengthX = standardSheathingLength/4
    -listTopThickness;
listTopLengthY = standardSheathingWidth;

// 6 legs (Pine)
legLength = 900
    -plywoodTopThickness
    -mdfTopThickness
    -listTopWidth;
legWidth = 69;
legThickness = 42;

// 3 bottom list (Pine)
listBottomThickness = 20; 
listBottomWidth1 = 60;
listBottomWidth2 = listBottomWidth1
    -plywoodTopThickness;
listBottomLengthX = standardSheathingLength;
listBottomLengthY = standardSheathingWidth;
listBottomLengthY2 = standardSheathingWidth
    +listBottomThickness*2;
bottomHeight = 100;

storageUnitLength=standardSheathingLength/2
    -legThickness*3/2;
storageUnitWidth=400;  
storageUnitHeight=(900-edgeTopWidth)
    -(bottomHeight+listBottomWidth2);
storageUnitThickness=12;


thickness = storageUnitThickness;

length = storageUnitLength;
width  = storageUnitWidth;
height = storageUnitHeight;


x=0;
y=0;
z=0;
zRotate=180;

drawerStorage (
    thickness,
    length,
    width,
    height,
    x,y,z,
    zRotate
    );
